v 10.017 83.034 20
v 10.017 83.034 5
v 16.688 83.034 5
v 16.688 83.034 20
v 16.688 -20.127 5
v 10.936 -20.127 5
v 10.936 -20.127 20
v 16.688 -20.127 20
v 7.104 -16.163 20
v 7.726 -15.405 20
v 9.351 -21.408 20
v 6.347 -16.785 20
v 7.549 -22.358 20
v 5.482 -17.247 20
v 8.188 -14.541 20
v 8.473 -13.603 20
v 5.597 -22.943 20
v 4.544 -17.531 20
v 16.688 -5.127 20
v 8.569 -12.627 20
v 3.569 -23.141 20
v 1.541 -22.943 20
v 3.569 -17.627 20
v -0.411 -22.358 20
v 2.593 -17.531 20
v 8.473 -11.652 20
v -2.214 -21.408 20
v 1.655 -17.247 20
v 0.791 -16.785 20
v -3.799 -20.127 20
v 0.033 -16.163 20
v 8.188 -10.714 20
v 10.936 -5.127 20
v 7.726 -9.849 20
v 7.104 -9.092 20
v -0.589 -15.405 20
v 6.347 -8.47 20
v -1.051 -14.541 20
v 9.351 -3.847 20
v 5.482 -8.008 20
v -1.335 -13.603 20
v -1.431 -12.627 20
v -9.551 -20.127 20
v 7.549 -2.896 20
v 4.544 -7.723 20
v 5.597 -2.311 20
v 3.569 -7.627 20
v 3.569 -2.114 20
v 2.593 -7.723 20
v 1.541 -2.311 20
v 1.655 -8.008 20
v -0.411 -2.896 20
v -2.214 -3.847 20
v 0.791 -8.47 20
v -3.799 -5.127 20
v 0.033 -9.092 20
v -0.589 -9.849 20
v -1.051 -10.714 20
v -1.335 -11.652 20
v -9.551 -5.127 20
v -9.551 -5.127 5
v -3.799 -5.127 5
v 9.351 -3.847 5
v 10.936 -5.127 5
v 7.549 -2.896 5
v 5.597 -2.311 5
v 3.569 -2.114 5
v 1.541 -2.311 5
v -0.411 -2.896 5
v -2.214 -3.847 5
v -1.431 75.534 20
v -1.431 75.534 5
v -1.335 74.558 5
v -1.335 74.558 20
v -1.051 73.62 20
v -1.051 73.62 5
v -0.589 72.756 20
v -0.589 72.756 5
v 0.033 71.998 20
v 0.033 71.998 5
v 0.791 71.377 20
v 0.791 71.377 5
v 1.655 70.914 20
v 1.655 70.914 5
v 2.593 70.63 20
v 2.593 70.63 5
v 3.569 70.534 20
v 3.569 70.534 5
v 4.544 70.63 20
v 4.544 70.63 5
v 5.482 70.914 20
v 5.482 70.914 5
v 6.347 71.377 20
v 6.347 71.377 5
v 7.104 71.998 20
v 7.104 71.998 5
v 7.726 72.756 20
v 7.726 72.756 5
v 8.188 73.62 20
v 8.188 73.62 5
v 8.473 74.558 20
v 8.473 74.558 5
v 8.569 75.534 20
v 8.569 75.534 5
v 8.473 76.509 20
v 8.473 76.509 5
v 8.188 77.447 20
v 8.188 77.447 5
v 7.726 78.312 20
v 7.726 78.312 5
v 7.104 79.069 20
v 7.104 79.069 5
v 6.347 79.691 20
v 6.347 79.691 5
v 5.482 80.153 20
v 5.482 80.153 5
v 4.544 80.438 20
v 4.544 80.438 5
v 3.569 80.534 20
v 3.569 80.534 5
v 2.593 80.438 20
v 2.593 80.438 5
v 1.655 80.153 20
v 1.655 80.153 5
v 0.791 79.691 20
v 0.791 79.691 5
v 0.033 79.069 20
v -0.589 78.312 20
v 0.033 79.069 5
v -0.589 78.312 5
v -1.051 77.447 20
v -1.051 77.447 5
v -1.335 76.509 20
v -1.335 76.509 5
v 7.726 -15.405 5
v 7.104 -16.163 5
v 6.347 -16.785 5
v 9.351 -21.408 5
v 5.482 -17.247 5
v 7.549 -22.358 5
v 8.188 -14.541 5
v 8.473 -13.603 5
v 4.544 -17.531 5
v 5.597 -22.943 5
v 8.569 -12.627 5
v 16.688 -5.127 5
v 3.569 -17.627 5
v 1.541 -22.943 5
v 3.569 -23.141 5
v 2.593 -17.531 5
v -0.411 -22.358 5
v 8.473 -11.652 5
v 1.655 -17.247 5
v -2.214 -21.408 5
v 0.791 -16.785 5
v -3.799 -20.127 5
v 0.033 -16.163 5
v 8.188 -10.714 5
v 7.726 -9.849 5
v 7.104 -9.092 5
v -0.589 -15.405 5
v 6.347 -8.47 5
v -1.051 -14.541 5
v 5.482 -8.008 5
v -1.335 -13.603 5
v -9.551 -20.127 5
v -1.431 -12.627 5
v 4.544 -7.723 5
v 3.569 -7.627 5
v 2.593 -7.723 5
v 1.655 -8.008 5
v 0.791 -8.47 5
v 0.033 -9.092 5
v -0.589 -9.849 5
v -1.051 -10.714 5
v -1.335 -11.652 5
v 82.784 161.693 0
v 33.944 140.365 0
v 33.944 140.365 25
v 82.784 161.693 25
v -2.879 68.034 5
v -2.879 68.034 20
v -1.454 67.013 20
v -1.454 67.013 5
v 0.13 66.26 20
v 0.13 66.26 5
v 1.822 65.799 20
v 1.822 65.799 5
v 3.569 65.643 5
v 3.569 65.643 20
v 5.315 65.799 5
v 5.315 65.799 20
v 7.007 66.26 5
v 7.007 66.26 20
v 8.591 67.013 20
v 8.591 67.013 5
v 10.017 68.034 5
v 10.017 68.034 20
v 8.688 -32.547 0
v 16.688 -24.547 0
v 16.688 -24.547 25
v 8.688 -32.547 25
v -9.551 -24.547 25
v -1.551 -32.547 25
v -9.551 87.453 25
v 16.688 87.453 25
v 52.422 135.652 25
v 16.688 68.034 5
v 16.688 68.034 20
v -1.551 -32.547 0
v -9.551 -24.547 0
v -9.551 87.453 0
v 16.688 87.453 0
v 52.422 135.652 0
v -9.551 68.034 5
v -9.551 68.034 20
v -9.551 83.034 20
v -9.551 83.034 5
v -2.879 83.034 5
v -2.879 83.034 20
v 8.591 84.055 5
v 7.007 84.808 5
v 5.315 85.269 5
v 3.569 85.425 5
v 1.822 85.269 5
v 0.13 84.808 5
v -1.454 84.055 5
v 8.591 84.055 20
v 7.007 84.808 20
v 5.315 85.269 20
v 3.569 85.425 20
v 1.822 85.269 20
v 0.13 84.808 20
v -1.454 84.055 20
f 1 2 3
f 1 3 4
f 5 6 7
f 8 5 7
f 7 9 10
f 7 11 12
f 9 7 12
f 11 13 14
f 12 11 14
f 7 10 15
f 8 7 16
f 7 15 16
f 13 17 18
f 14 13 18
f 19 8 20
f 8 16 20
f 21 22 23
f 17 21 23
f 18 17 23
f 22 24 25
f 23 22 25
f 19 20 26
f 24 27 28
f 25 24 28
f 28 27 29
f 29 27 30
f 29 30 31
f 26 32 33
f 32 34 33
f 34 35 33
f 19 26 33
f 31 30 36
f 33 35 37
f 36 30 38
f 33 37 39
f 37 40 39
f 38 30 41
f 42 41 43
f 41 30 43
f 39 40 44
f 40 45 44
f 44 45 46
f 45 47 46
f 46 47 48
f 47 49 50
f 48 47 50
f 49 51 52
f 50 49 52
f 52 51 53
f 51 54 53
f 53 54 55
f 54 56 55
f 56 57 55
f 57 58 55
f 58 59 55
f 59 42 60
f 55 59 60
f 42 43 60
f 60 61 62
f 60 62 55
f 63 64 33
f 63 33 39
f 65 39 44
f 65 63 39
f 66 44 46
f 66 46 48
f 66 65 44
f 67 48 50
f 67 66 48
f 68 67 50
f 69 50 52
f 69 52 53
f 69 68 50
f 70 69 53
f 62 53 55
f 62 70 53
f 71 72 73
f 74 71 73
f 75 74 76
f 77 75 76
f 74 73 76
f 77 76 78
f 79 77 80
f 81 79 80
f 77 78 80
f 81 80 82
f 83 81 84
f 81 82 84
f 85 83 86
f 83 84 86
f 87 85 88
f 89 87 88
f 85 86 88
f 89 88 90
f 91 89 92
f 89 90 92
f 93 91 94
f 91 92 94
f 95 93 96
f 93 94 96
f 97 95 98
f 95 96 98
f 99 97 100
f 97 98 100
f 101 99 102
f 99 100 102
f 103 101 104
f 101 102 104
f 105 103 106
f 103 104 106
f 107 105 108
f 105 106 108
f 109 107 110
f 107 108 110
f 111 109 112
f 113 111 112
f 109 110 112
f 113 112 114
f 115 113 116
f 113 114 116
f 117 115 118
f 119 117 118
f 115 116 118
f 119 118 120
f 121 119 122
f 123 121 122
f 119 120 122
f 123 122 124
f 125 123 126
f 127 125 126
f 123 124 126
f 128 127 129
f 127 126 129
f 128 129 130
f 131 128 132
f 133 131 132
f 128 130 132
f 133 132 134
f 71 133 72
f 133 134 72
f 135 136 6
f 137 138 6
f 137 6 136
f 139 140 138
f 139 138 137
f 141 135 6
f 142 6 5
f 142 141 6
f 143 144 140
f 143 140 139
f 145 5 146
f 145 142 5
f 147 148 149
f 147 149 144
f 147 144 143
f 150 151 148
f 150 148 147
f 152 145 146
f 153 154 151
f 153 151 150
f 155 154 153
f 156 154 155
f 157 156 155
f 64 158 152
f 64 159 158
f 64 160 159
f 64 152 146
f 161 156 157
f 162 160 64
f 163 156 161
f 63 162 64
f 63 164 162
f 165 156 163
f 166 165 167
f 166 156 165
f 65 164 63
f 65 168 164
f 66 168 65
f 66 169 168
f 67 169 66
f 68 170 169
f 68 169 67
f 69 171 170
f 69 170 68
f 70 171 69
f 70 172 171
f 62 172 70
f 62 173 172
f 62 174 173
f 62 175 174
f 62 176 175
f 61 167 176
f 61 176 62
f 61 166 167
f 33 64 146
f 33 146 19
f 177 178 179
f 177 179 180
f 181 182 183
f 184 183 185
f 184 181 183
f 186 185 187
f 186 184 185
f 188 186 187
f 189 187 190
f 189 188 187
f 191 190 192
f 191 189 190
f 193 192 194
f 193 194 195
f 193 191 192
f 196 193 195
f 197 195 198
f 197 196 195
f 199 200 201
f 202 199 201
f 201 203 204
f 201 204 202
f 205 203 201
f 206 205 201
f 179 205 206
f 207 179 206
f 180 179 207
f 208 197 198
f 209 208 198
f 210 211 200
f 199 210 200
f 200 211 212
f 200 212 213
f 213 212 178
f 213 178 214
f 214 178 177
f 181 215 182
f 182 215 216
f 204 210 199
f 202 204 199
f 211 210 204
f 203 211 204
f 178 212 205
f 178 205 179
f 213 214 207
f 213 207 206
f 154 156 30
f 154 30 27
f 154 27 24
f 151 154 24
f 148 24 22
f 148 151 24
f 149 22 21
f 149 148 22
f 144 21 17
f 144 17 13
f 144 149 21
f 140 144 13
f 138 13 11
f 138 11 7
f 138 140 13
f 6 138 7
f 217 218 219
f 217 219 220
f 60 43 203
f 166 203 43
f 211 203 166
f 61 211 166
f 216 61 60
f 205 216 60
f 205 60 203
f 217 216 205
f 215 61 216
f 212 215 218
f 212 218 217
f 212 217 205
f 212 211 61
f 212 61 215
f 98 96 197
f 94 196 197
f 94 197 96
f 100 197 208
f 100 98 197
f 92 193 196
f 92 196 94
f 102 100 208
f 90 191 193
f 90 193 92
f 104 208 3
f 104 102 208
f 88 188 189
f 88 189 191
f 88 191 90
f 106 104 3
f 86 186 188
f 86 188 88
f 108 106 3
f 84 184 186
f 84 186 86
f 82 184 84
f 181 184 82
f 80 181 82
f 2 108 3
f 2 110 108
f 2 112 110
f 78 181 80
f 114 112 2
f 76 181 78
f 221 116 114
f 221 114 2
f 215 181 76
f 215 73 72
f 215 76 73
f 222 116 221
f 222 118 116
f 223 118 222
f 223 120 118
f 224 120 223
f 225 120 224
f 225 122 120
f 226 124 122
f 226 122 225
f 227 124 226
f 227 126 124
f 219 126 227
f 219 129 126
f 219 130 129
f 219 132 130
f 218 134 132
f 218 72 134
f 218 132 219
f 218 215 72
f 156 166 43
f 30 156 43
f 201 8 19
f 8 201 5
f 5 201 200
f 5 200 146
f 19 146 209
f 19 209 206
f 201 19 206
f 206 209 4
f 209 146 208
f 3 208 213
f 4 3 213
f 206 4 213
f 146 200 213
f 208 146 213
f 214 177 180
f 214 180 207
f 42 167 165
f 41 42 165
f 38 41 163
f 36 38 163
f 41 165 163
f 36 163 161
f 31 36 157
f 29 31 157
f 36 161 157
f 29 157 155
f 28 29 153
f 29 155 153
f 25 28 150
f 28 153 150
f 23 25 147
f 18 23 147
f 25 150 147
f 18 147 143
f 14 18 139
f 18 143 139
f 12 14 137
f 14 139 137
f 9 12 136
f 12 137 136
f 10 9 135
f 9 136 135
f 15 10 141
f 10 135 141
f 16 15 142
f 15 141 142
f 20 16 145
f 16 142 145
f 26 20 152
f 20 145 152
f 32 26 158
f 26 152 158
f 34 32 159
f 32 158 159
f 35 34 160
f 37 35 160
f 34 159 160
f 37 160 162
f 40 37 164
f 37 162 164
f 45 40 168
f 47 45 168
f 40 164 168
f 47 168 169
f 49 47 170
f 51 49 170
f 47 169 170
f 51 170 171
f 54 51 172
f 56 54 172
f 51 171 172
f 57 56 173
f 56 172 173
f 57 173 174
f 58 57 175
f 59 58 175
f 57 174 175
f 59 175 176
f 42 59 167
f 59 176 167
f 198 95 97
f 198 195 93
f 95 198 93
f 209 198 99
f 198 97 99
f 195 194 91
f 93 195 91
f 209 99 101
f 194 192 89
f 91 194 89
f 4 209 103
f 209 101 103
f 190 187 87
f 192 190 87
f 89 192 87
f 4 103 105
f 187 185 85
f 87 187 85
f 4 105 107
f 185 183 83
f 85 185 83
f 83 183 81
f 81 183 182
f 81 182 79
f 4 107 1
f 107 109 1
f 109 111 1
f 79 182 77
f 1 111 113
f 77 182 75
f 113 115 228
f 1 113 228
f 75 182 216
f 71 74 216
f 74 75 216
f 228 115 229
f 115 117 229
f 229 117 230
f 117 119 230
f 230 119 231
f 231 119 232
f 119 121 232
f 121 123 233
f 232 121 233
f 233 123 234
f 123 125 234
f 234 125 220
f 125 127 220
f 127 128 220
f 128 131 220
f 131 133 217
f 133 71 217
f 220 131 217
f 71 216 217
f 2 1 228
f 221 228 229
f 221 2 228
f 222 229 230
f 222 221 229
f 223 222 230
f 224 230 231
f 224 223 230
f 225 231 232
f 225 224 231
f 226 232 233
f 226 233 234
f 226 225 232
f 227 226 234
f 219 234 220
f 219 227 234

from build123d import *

# Parameters (mm, degrees)
SKETCH_1_W          = 26.239617318
SKETCH_1_H          = 120
EXTRUDE_1_DEPTH     = 25
CHAMFER_1_SIZE      = 8
SKETCH_3_W          = 15
SKETCH_3_H          = 15
CUT_EXTRUDE_4_DEPTH = 35
SKETCH_4_R          = 5
EXTRUDE_2_DEPTH     = 15
SKETCH_5_R          = 10.513466809
SKETCH_5_R_2        = 5
CUT_EXTRUDE_5_DEPTH = 15
SKETCH_6_W          = 15
SKETCH_6_H          = 15
CUT_EXTRUDE_6_DEPTH = 188.870930903
SKETCH_7_R          = 5
EXTRUDE_3_DEPTH     = 15
SKETCH_8_R          = 5
CUT_EXTRUDE_9_DEPTH = 15


with BuildPart() as part:
    # 草图1 → 凸台-拉伸1 (new body)
    with BuildSketch(Plane.XY):
        with Locations((3.568688241, 27.453328425)):
            Rectangle(SKETCH_1_W, SKETCH_1_H)
        Polygon((52.421783721, 135.65221029), (16.6884969, 87.453328425), (-9.551120418, 87.453328425), (33.944293966, 140.364941184), (82.783975756, 161.693279677), align=None)
    extrude(amount=EXTRUDE_1_DEPTH)

    # 倒角1
    chamfer_1_edges = [part.edges().sort_by_distance(p)[0] for p in [
        (16.6884969, -32.546671575, 12.5),
        (-9.551120418, -32.546671575, 12.5),
    ]]
    chamfer(chamfer_1_edges, length=CHAMFER_1_SIZE)

    # 草图3 → 切除-拉伸4 (cut)
    with BuildSketch(Plane.ZY.offset(9.551120418)):
        with Locations((12.5, -12.627226007)):
            Rectangle(SKETCH_3_W, SKETCH_3_H)
    extrude(amount=-CUT_EXTRUDE_4_DEPTH, mode=Mode.SUBTRACT)

    # 草图4 → 凸台-拉伸2 (add)
    with BuildSketch(Plane.XY.offset(5)):
        with Locations(Location((3.568688241, -12.627226007, 0), (0, 0, 180))):
            Circle(SKETCH_4_R)
    extrude(amount=EXTRUDE_2_DEPTH)

    # 草图5 → 切除-拉伸5 (cut)
    with BuildSketch(Plane.XY.offset(5)):
        with Locations((3.568688241, -12.627226007)):
            Circle(SKETCH_5_R)
        with Locations(Location((3.568688241, -12.627226007, 0), (0, 0, 180))):
            Circle(SKETCH_5_R_2, mode=Mode.SUBTRACT)
    extrude(amount=CUT_EXTRUDE_5_DEPTH, mode=Mode.SUBTRACT)

    # 草图6 → 切除-拉伸6 (cut, through all)
    with BuildSketch(Plane.ZY.offset(9.551120418)):
        with Locations((12.5, 75.533882858)):
            Rectangle(SKETCH_6_W, SKETCH_6_H)
    extrude(amount=-CUT_EXTRUDE_6_DEPTH, mode=Mode.SUBTRACT)

    # 草图7 → 凸台-拉伸3 (add)
    with BuildSketch(Plane.XY.offset(5)):
        with Locations(Location((3.568688241, 75.533882858, 0), (0, 0, 180))):
            Circle(SKETCH_7_R)
    extrude(amount=EXTRUDE_3_DEPTH)

    # 草图8 → 切除-拉伸9 (cut)
    # profile 1 of 3: a face of its own
    with BuildSketch(Plane.XY.offset(5)):
        with BuildLine():
            ThreePointArc((13.459511585, 75.533882858), (12.557728949, 79.660083722), (10.016818701, 83.033882858))
            Line((10.016818701, 83.033882858), (-2.879442218, 83.033882858))
            ThreePointArc((-2.879442218, 83.033882858), (-6.322135103, 75.533882858), (-2.879442218, 68.033882858))
            Line((-2.879442218, 68.033882858), (10.016818701, 68.033882858))
            ThreePointArc((10.016818701, 68.033882858), (12.557728949, 71.407681993), (13.459511585, 75.533882858))
        make_face()
        with Locations(Location((3.568688241, 75.533882858, 0), (0, 0, 180))):
            Circle(SKETCH_8_R, mode=Mode.SUBTRACT)
    # profile 2 of 3: a face of its own
    with BuildSketch(Plane.XY.offset(5)):
        with BuildLine():
            Line((-2.879442218, 83.033882858), (10.016818701, 83.033882858))
            ThreePointArc((10.016818701, 83.033882858), (3.568688241, 85.424706202), (-2.879442218, 83.033882858))
        make_face()
    # profile 3 of 3: a face of its own
    with BuildSketch(Plane.XY.offset(5)):
        with BuildLine():
            ThreePointArc((-2.879442218, 68.033882858), (3.568688241, 65.643059514), (10.016818701, 68.033882858))
            Line((10.016818701, 68.033882858), (-2.879442218, 68.033882858))
        make_face()
    extrude(amount=CUT_EXTRUDE_9_DEPTH, mode=Mode.SUBTRACT)


solid = part.part
